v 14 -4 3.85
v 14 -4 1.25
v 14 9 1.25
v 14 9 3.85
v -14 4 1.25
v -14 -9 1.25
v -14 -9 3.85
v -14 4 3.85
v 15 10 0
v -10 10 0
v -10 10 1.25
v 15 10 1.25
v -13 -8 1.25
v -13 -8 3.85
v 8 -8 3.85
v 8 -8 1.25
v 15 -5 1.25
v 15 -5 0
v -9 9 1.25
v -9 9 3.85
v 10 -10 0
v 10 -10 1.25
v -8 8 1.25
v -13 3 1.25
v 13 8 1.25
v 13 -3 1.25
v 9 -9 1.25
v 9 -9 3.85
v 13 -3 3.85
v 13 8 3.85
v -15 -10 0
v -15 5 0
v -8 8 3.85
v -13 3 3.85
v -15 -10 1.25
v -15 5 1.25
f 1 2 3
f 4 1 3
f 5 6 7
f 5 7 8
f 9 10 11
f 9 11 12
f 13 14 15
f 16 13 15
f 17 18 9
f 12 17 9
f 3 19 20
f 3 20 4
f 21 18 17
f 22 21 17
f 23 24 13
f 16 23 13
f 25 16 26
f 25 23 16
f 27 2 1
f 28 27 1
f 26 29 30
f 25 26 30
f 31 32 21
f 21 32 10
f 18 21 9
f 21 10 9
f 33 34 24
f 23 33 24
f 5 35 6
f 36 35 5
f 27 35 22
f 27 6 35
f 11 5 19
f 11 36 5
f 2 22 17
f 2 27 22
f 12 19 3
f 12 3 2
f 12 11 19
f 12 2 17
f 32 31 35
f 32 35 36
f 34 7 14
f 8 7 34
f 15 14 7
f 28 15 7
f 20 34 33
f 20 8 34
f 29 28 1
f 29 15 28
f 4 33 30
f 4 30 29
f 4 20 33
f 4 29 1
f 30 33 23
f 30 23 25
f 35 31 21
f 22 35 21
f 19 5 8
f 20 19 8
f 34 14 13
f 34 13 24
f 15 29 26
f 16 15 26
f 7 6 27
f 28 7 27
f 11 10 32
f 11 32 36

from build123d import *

# Parameters (mm, degrees)
F0_W     = 30
F0_H     = 20
F1_DEPTH = 1.25
F2_W     = 28
F2_H     = 18
F3_DEPTH = 2.6
F4_W     = 26
F4_H     = 16
F5_DEPTH = 2.6
F6_SIZE  = 5
F7_SIZE  = 5


with BuildPart() as f1:
    # F0 (on Top) → F1 (new body)
    with BuildSketch(Plane.XY):
        Rectangle(F0_W, F0_H)
    extrude(amount=F1_DEPTH)

    # F2 (on face) → F3 (join)
    with BuildSketch(Plane.XY.offset(1.25)):
        Rectangle(F2_W, F2_H)
    extrude(amount=F3_DEPTH)

    # F4 (on face) → F5 (cut)
    with BuildSketch(Plane.XY.offset(3.85)):
        Rectangle(F4_W, F4_H)
    extrude(amount=-F5_DEPTH, mode=Mode.SUBTRACT)

    # F6
    f6_edges = [f1.edges().sort_by_distance(p)[0] for p in [
        (-13, 8, 2.55),
        (13, -8, 2.55),
        (-14, 9, 2.55),
        (14, -9, 2.55),
    ]]
    chamfer(f6_edges, length=F6_SIZE)

    # F7
    f7_edges = [f1.edges().sort_by_distance(p)[0] for p in [
        (15, -10, 0.625),
        (-15, 10, 0.625),
    ]]
    chamfer(f7_edges, length=F7_SIZE)


solid = f1.part
